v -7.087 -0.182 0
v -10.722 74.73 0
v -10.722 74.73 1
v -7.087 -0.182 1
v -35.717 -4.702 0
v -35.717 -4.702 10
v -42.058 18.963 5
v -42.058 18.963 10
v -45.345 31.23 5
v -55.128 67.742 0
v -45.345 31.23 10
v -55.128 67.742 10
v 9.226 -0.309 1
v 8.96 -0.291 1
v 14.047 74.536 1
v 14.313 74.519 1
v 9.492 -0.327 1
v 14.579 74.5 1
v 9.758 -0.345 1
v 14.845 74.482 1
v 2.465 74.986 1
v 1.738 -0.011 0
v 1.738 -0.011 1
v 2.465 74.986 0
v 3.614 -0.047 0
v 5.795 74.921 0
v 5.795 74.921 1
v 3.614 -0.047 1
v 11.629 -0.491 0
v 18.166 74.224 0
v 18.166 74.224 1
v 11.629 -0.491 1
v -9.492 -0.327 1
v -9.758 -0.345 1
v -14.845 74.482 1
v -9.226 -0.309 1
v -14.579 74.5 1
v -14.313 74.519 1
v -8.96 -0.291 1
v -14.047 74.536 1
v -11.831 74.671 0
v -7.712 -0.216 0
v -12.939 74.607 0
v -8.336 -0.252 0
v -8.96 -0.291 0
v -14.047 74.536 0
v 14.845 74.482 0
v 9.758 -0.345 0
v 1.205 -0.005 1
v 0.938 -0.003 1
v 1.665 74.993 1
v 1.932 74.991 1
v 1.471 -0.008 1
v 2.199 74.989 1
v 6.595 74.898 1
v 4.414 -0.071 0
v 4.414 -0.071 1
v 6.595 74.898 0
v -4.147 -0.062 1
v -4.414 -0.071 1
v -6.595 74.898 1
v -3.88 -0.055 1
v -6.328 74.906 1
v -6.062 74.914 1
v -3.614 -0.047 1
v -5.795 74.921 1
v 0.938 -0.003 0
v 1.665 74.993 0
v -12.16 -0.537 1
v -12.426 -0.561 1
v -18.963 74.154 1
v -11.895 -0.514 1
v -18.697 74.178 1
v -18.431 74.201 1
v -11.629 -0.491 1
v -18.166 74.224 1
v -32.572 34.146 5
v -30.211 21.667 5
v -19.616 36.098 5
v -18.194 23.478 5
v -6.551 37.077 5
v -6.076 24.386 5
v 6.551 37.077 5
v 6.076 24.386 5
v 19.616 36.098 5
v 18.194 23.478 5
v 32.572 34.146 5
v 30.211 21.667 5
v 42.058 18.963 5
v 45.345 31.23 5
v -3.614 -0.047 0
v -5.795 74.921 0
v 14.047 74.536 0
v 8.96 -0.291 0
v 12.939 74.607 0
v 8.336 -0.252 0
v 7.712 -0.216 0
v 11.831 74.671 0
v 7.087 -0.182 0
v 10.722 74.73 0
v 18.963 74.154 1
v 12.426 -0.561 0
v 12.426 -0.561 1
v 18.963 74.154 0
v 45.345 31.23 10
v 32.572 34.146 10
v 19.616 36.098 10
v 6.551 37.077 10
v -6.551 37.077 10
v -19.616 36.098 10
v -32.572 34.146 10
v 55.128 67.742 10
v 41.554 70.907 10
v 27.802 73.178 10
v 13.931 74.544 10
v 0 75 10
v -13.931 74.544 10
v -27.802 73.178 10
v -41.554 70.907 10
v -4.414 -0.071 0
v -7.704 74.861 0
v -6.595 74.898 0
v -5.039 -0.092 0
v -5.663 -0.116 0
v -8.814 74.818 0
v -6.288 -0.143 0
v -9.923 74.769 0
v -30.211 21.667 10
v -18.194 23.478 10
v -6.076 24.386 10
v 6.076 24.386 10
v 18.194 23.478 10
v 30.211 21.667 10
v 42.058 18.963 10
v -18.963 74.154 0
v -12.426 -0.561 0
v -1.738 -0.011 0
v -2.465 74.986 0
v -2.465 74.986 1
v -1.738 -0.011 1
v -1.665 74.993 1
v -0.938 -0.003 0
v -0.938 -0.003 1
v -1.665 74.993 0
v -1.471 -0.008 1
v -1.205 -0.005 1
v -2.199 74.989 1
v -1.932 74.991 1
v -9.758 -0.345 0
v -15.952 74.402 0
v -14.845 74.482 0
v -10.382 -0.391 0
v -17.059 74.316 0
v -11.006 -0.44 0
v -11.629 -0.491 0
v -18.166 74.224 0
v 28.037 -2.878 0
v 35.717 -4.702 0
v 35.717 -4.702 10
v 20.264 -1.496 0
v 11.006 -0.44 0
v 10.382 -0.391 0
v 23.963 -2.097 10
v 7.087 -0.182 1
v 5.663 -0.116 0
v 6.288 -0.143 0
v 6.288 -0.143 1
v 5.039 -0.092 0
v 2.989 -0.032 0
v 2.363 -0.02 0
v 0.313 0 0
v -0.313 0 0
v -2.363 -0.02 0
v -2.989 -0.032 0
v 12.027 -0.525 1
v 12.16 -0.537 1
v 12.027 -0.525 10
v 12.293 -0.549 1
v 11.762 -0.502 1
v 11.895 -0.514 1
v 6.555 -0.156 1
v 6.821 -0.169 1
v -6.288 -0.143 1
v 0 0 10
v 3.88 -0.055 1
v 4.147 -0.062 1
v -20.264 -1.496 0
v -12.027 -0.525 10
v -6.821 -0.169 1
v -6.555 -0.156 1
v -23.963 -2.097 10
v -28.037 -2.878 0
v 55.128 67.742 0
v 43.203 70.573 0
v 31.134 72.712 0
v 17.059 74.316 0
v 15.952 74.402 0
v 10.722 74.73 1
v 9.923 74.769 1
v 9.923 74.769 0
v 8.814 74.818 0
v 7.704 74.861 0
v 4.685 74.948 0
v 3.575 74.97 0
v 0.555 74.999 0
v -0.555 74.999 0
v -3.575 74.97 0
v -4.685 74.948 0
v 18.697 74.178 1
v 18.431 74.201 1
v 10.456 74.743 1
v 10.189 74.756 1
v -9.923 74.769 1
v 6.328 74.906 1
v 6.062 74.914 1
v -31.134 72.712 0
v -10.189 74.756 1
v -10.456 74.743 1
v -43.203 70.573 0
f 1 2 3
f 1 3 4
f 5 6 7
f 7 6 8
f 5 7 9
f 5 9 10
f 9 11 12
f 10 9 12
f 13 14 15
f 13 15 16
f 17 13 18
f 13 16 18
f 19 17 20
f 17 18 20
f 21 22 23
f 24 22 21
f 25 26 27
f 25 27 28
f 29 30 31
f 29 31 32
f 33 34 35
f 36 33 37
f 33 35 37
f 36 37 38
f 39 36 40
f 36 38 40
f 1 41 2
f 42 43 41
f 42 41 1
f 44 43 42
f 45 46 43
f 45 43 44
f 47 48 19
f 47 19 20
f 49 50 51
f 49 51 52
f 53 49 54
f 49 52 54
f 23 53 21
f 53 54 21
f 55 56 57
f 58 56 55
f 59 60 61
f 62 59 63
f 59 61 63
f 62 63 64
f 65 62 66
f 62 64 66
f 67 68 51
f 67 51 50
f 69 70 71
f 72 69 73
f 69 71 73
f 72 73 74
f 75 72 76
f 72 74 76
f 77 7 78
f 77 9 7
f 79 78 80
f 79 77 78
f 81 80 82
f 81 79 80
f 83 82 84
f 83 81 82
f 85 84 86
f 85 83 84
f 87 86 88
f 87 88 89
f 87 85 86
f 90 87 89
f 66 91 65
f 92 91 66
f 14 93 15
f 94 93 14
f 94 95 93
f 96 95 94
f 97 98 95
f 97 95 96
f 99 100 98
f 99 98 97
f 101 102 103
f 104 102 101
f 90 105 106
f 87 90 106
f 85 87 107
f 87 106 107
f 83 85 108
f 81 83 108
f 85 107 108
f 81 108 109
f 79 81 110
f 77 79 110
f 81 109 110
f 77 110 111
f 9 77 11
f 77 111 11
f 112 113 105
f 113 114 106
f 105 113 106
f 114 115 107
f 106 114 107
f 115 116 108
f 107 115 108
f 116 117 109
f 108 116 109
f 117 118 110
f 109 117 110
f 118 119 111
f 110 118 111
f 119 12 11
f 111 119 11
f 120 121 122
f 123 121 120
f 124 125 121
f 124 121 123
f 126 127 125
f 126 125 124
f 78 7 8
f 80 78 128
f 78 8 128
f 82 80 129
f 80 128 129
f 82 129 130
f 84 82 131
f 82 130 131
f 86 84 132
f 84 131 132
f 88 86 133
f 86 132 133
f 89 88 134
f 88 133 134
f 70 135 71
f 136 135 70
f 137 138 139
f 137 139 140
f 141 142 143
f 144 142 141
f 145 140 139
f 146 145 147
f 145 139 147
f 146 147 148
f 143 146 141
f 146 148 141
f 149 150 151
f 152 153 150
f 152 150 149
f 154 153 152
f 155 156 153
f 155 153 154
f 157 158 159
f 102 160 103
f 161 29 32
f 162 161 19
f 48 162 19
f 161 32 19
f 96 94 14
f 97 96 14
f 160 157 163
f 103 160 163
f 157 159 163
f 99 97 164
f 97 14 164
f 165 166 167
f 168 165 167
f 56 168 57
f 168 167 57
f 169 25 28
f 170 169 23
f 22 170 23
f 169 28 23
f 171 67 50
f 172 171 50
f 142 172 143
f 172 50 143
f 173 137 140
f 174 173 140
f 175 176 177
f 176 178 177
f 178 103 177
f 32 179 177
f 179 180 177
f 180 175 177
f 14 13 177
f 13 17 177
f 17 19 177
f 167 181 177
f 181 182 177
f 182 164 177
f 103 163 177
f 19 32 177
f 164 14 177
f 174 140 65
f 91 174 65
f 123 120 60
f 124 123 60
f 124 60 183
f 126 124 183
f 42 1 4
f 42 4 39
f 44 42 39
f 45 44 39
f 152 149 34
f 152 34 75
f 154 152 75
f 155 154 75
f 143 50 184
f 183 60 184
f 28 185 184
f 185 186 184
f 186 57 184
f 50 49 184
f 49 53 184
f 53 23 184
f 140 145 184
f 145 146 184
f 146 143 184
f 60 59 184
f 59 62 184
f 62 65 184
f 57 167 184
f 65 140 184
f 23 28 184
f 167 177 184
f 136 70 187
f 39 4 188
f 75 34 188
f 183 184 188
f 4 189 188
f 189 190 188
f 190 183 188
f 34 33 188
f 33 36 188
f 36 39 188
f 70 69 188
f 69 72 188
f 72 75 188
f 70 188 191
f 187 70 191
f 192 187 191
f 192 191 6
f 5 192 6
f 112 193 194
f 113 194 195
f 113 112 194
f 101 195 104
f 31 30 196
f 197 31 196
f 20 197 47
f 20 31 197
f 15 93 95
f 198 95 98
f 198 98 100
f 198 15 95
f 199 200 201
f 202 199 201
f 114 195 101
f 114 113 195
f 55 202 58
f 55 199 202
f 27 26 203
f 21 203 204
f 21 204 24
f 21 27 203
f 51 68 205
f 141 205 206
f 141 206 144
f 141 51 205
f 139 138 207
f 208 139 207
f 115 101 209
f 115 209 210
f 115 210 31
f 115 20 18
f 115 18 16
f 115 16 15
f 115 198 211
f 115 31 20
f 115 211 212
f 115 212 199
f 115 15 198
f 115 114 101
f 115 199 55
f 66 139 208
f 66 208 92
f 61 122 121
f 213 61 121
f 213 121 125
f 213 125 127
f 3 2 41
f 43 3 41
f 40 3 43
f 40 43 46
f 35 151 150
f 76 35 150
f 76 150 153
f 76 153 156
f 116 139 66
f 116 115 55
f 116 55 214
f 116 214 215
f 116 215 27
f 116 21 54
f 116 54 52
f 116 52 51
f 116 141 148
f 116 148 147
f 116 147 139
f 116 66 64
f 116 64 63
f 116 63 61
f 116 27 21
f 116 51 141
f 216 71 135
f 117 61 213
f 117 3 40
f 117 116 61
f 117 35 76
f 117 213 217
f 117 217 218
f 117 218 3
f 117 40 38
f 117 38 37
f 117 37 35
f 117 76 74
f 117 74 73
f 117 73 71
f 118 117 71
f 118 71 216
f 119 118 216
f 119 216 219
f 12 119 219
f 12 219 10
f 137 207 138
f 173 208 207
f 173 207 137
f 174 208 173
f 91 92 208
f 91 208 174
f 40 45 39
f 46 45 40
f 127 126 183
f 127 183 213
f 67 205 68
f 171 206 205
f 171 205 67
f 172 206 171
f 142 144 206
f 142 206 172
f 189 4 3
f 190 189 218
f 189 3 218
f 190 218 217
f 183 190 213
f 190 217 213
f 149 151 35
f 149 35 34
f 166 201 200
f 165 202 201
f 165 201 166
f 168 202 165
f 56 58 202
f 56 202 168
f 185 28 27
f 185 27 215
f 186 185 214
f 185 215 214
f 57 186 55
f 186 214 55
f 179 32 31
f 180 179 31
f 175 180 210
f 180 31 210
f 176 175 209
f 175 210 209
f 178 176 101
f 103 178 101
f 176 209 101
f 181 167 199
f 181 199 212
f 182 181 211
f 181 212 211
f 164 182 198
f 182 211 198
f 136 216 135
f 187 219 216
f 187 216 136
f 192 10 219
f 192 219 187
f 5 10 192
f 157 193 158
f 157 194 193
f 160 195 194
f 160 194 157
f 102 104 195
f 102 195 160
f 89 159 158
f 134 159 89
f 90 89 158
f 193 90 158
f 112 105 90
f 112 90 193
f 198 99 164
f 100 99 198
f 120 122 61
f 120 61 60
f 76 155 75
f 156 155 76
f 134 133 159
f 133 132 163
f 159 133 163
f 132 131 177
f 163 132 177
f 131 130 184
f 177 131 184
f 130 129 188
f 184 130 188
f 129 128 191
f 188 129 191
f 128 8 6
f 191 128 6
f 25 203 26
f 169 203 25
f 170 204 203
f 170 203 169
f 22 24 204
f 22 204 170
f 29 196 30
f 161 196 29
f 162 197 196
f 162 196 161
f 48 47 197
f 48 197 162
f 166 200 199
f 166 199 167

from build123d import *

# Parameters (mm, degrees)
F1_W          = 75
F1_H          = 10
F2_ANGLE_BACK = 15
F2_ANGLE      = 30
F3_DEPTH      = 1
F5_DEPTH      = 5


with BuildPart() as f2:
    # F1 (on Right) → F2 (revolve)
    with BuildSketch(Plane.YZ, mode=Mode.PRIVATE) as f2_sk:
        with Locations((37.5, 5)):
            Rectangle(F1_W, F1_H)
    revolve(f2_sk.sketch.rotate(Axis((0, -138, 25.0724516809), (0, 0, 1)), -F2_ANGLE_BACK), axis=Axis((0, -138, 25.0724516809), (0, 0, 1)), revolution_arc=F2_ANGLE)

    # F0 (on Top) → F3 (cut)
    with BuildSketch(Plane.XY):
        with BuildLine():
            Line((-21.1415446532, 99.0594758487), (-12.4259198532, -0.5605714658))
            ThreePointArc((-12.4259198532, -0.5605714658), (-12.0274924992, -0.5251316633), (-11.6289640948, -0.4908468716))
            Line((-11.6289640948, -0.4908468716), (-20.3445888947, 99.1292004429))
            Line((-20.3445888947, 99.1292004429), (-21.1415446532, 99.0594758487))
        make_face()
        with BuildLine():
            Line((-16.5406704722, 99.4248643684), (-9.7584498559, -0.3454590055))
            ThreePointArc((-9.7584498559, -0.3454590055), (-9.359410193, -0.3177519037), (-8.9602918959, -0.2912015551))
            Line((-8.9602918959, -0.2912015551), (-15.7425125122, 99.4791218187))
            Line((-15.7425125122, 99.4791218187), (-16.5406704722, 99.4248643684))
        make_face()
        with BuildLine():
            Line((-11.9335760215, 99.7009671064), (-7.0873101046, -0.1821127884))
            ThreePointArc((-7.0873101046, -0.1821127884), (-6.6878081953, -0.1621488069), (-6.2882500977, -0.1433428858))
            Line((-6.2882500977, -0.1433428858), (-11.1345160146, 99.739737009))
            Line((-11.1345160146, 99.739737009), (-11.9335760215, 99.7009671064))
        make_face()
        with BuildLine():
            Line((-7.3219938409, 99.8876802321), (-4.4135051058, -0.0705942423))
            ThreePointArc((-4.4135051058, -0.0705942423), (-4.0136911865, -0.0583808887), (-3.6138435458, -0.0473264673))
            Line((-3.6138435458, -0.0473264673), (-6.5223322808, 99.9109480071))
            Line((-6.5223322808, 99.9109480071), (-7.3219938409, 99.8876802321))
        make_face()
        with BuildLine():
            Line((-2.7076581579, 99.98493353), (-1.7380403683, -0.0109453048))
            ThreePointArc((-1.7380403683, -0.0109453048), (-1.3380647927, -0.006487172), (-0.9380779751, -0.0031884074))
            Line((-0.9380779751, -0.0031884074), (-1.9076957647, 99.9926904274))
            Line((-1.9076957647, 99.9926904274), (-2.7076581579, 99.98493353))
        make_face()
        with BuildLine():
            ThreePointArc((0.9380779751, -0.0031884074), (1.3380647927, -0.006487172), (1.7380403683, -0.0109453048))
            Line((1.7380403683, -0.0109453048), (2.7076581579, 99.98493353))
            Line((2.7076581579, 99.98493353), (1.9076957647, 99.9926904274))
            Line((1.9076957647, 99.9926904274), (0.9380779751, -0.0031884074))
        make_face()
        with BuildLine():
            ThreePointArc((3.6138435458, -0.0473264673), (4.0136911865, -0.0583808887), (4.4135051058, -0.0705942423))
            Line((4.4135051058, -0.0705942423), (7.3219938409, 99.8876802321))
            Line((7.3219938409, 99.8876802321), (6.5223322808, 99.9109480071))
            Line((6.5223322808, 99.9109480071), (3.6138435458, -0.0473264673))
        make_face()
        with BuildLine():
            ThreePointArc((6.2882500977, -0.1433428858), (6.6878081953, -0.1621488069), (7.0873101046, -0.1821127884))
            Line((7.0873101046, -0.1821127884), (11.9335760215, 99.7009671064))
            Line((11.9335760215, 99.7009671064), (11.1345160146, 99.739737009))
            Line((11.1345160146, 99.739737009), (6.2882500977, -0.1433428858))
        make_face()
        with BuildLine():
            ThreePointArc((8.9602918959, -0.2912015551), (9.359410193, -0.3177519037), (9.7584498559, -0.3454590055))
            Line((9.7584498559, -0.3454590055), (16.5406704722, 99.4248643684))
            Line((16.5406704722, 99.4248643684), (15.7425125122, 99.4791218187))
            Line((15.7425125122, 99.4791218187), (8.9602918959, -0.2912015551))
        make_face()
        with BuildLine():
            ThreePointArc((12.0274924992, -0.5251316633), (12.2267190167, -0.5427072066), (12.4259198532, -0.5605714658))
            Line((12.4259198532, -0.5605714658), (21.1415446532, 99.0594758487))
            Line((21.1415446532, 99.0594758487), (20.3445888947, 99.1292004429))
            Line((20.3445888947, 99.1292004429), (11.6289640948, -0.4908468716))
            ThreePointArc((11.6289640948, -0.4908468716), (11.828240719, -0.5078448729), (12.0274924992, -0.5251316633))
        make_face()
    extrude(amount=F3_DEPTH, mode=Mode.SUBTRACT)

    # F4 (on face) → F5 (cut)
    with BuildSketch(Plane.XY.offset(10)):
        with BuildLine():
            ThreePointArc((42.0580948292, 18.962946772), (128.9199177973, -39.0762677861), (162.5, -138))
            ThreePointArc((162.5, -138), (-98.9237322139, -266.9199177973), (-42.0580948292, 18.962946772))
            Line((-42.0580948292, 18.962946772), (-45.345096702, 31.2302047658))
            ThreePointArc((-45.345096702, 31.2302047658), (-106.6550023623, -276.995505219), (175.2, -138))
            ThreePointArc((175.2, -138), (138.995505219, -31.3449976377), (45.345096702, 31.2302047658))
            Line((45.345096702, 31.2302047658), (42.0580948292, 18.962946772))
        make_face()
        with BuildLine():
            ThreePointArc((-42.0580948292, 18.962946772), (0, 24.5), (42.0580948292, 18.962946772))
            Line((42.0580948292, 18.962946772), (45.345096702, 31.2302047658))
            ThreePointArc((45.345096702, 31.2302047658), (0, 37.2), (-45.345096702, 31.2302047658))
            Line((-45.345096702, 31.2302047658), (-42.0580948292, 18.962946772))
        make_face()
    extrude(amount=-F5_DEPTH, mode=Mode.SUBTRACT)


solid = f2.part
